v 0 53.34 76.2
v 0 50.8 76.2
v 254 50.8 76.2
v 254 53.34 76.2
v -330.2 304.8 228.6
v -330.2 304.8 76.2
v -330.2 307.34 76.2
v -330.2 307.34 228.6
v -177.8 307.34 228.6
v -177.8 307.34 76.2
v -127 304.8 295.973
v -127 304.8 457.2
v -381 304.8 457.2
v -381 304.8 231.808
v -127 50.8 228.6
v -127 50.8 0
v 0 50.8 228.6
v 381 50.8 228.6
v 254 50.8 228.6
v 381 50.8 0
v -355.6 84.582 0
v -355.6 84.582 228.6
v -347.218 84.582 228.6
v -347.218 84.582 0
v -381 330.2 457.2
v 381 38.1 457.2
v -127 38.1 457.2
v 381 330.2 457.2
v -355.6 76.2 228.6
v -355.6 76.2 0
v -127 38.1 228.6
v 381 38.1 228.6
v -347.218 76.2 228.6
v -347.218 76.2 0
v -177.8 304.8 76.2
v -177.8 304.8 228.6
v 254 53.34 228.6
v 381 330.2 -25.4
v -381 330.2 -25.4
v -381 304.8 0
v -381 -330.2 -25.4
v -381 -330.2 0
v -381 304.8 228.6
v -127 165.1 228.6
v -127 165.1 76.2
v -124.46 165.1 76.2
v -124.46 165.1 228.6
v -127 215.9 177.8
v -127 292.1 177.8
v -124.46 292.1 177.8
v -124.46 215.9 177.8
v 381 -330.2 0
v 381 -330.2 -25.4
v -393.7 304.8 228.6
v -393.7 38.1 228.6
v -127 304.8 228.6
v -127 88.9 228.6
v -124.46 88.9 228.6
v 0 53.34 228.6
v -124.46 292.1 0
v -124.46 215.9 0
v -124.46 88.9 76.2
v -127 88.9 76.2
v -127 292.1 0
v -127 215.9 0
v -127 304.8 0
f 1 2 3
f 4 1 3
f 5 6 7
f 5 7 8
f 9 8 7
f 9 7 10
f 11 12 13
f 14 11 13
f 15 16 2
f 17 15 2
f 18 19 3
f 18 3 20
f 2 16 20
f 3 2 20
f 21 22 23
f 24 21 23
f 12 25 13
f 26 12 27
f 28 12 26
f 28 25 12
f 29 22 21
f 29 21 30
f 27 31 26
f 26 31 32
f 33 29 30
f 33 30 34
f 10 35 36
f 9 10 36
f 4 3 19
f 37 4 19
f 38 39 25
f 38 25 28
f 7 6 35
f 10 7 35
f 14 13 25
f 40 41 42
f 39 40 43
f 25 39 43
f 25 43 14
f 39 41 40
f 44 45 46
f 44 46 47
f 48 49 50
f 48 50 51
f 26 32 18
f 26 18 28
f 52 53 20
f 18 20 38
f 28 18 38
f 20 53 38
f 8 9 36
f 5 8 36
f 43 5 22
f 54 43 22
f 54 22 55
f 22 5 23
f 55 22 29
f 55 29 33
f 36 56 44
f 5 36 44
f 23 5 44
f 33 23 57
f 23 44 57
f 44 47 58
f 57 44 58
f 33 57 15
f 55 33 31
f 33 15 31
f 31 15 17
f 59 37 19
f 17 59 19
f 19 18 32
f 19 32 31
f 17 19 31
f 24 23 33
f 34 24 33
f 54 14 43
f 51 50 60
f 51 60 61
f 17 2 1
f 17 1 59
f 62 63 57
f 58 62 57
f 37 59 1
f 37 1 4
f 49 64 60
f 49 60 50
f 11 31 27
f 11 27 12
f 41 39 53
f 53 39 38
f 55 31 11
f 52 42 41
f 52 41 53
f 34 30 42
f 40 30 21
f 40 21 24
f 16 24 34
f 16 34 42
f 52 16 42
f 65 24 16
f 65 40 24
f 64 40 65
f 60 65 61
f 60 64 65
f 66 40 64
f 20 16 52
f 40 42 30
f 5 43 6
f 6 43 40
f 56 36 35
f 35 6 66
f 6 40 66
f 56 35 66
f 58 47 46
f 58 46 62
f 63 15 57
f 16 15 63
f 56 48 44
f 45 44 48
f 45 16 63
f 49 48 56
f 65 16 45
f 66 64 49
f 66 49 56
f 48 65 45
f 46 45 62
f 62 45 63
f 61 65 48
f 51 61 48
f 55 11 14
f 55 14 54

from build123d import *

# Parameters (mm, degrees)
F0_W      = 762
F0_H      = 660.4
F1_DEPTH  = 25.4
F2_W      = 508
F2_H      = 279.4
F3_DEPTH  = 228.6
F4_W      = 254
F4_H      = 152.4
F5_DEPTH  = 2.54
F6_W      = 254
F6_H      = 228.6
F7_DEPTH  = 25.4
F8_W      = 76.2
F8_H      = 152.4
F8_H_2    = 177.8
F9_DEPTH  = 2.54
F11_W     = 152.4
F11_H     = 152.4
F12_DEPTH = 2.54
F13_W     = 508
F13_H     = 292.1
F14_DEPTH = 228.6
F16_W     = 254
F16_H     = 25.4
F17_DEPTH = 228.6
F18_DEPTH = 266.7
F20_DEPTH = 266.701
F21_W     = 8.382
F21_H     = 8.382
F22_DEPTH = 228.6


with BuildPart() as f1:
    # F0 (on Top) → F1 (new body)
    with BuildSketch(Plane.XY):
        Rectangle(F0_W, F0_H)
    extrude(amount=-F1_DEPTH)

    # F2 (on face) → F3 (join)
    with BuildSketch(Plane.XY):
        with Locations((127, 190.5)):
            Rectangle(F2_W, F2_H)
    extrude(amount=F3_DEPTH)

    # F4 (on face) → F5 (cut)
    with BuildSketch(Plane.XZ.offset(-50.8)):
        with Locations((127, 152.4)):
            Rectangle(F4_W, F4_H)
    extrude(amount=-F5_DEPTH, mode=Mode.SUBTRACT)

    # F8 (on face) → F9 (cut)
    with BuildSketch(Plane(origin=(-127, 0, 0), x_dir=(0, -1, 0), z_dir=(-1, 0, 0))):
        with Locations((-127, 152.4)):
            Rectangle(F8_W, F8_H)
        with Locations((-254, 88.9)):
            Rectangle(F8_W, F8_H_2)
    extrude(amount=-F9_DEPTH, mode=Mode.SUBTRACT)


with BuildPart() as f7:
    # F6 (on face) → F7 (new body)
    with BuildSketch(Plane(origin=(0, 330.2, 0), x_dir=(-1, 0, 0), z_dir=(0, 1, 0))):
        with Locations((254, 114.3)):
            Rectangle(F6_W, F6_H)
    extrude(amount=-F7_DEPTH)

    # F10: union F1
    add(f1.part)

    # F11 (on face) → F12 (cut)
    with BuildSketch(Plane.XZ.offset(-304.8)):
        with Locations((-254, 152.4)):
            Rectangle(F11_W, F11_H)
    extrude(amount=-F12_DEPTH, mode=Mode.SUBTRACT)

    # F13 (on face) → F14 (join)
    with BuildSketch(Plane.XY.offset(228.6)):
        with Locations((127, 184.15)):
            Rectangle(F13_W, F13_H)
    extrude(amount=F14_DEPTH)

    # F16 (on face) → F17 (join)
    with BuildSketch(Plane.XY.offset(228.6)):
        with Locations((-254, 317.5)):
            Rectangle(F16_W, F16_H)
    extrude(amount=F17_DEPTH)

    # F15 (on face) → F18 (join)
    with BuildSketch(Plane(origin=(-127, 0, 0), x_dir=(0, -1, 0), z_dir=(-1, 0, 0))):
        Polygon((-304.8, 295.9728837013), (-304.8, 228.6), (-38.1, 228.6), align=None)
    extrude(amount=F18_DEPTH)

    # F19 (on face) → F20 (cut, through all)
    with BuildSketch(Plane(origin=(0, 304.8, 0), x_dir=(-1, 0, 0), z_dir=(0, 1, 0))):
        Polygon((127, 295.9728837013), (393.7, 228.6), (393.7, 295.9728837013), align=None)
    extrude(amount=-F20_DEPTH, mode=Mode.SUBTRACT)

    # F21 (on face) → F22 (join)
    with BuildSketch(Plane(origin=(0, 0, 228.6), x_dir=(1, 0, 0), z_dir=(0, 0, -1))):
        with Locations((-351.409, -80.391)):
            Rectangle(F21_W, F21_H)
    extrude(amount=F22_DEPTH)


solid = f7.part
